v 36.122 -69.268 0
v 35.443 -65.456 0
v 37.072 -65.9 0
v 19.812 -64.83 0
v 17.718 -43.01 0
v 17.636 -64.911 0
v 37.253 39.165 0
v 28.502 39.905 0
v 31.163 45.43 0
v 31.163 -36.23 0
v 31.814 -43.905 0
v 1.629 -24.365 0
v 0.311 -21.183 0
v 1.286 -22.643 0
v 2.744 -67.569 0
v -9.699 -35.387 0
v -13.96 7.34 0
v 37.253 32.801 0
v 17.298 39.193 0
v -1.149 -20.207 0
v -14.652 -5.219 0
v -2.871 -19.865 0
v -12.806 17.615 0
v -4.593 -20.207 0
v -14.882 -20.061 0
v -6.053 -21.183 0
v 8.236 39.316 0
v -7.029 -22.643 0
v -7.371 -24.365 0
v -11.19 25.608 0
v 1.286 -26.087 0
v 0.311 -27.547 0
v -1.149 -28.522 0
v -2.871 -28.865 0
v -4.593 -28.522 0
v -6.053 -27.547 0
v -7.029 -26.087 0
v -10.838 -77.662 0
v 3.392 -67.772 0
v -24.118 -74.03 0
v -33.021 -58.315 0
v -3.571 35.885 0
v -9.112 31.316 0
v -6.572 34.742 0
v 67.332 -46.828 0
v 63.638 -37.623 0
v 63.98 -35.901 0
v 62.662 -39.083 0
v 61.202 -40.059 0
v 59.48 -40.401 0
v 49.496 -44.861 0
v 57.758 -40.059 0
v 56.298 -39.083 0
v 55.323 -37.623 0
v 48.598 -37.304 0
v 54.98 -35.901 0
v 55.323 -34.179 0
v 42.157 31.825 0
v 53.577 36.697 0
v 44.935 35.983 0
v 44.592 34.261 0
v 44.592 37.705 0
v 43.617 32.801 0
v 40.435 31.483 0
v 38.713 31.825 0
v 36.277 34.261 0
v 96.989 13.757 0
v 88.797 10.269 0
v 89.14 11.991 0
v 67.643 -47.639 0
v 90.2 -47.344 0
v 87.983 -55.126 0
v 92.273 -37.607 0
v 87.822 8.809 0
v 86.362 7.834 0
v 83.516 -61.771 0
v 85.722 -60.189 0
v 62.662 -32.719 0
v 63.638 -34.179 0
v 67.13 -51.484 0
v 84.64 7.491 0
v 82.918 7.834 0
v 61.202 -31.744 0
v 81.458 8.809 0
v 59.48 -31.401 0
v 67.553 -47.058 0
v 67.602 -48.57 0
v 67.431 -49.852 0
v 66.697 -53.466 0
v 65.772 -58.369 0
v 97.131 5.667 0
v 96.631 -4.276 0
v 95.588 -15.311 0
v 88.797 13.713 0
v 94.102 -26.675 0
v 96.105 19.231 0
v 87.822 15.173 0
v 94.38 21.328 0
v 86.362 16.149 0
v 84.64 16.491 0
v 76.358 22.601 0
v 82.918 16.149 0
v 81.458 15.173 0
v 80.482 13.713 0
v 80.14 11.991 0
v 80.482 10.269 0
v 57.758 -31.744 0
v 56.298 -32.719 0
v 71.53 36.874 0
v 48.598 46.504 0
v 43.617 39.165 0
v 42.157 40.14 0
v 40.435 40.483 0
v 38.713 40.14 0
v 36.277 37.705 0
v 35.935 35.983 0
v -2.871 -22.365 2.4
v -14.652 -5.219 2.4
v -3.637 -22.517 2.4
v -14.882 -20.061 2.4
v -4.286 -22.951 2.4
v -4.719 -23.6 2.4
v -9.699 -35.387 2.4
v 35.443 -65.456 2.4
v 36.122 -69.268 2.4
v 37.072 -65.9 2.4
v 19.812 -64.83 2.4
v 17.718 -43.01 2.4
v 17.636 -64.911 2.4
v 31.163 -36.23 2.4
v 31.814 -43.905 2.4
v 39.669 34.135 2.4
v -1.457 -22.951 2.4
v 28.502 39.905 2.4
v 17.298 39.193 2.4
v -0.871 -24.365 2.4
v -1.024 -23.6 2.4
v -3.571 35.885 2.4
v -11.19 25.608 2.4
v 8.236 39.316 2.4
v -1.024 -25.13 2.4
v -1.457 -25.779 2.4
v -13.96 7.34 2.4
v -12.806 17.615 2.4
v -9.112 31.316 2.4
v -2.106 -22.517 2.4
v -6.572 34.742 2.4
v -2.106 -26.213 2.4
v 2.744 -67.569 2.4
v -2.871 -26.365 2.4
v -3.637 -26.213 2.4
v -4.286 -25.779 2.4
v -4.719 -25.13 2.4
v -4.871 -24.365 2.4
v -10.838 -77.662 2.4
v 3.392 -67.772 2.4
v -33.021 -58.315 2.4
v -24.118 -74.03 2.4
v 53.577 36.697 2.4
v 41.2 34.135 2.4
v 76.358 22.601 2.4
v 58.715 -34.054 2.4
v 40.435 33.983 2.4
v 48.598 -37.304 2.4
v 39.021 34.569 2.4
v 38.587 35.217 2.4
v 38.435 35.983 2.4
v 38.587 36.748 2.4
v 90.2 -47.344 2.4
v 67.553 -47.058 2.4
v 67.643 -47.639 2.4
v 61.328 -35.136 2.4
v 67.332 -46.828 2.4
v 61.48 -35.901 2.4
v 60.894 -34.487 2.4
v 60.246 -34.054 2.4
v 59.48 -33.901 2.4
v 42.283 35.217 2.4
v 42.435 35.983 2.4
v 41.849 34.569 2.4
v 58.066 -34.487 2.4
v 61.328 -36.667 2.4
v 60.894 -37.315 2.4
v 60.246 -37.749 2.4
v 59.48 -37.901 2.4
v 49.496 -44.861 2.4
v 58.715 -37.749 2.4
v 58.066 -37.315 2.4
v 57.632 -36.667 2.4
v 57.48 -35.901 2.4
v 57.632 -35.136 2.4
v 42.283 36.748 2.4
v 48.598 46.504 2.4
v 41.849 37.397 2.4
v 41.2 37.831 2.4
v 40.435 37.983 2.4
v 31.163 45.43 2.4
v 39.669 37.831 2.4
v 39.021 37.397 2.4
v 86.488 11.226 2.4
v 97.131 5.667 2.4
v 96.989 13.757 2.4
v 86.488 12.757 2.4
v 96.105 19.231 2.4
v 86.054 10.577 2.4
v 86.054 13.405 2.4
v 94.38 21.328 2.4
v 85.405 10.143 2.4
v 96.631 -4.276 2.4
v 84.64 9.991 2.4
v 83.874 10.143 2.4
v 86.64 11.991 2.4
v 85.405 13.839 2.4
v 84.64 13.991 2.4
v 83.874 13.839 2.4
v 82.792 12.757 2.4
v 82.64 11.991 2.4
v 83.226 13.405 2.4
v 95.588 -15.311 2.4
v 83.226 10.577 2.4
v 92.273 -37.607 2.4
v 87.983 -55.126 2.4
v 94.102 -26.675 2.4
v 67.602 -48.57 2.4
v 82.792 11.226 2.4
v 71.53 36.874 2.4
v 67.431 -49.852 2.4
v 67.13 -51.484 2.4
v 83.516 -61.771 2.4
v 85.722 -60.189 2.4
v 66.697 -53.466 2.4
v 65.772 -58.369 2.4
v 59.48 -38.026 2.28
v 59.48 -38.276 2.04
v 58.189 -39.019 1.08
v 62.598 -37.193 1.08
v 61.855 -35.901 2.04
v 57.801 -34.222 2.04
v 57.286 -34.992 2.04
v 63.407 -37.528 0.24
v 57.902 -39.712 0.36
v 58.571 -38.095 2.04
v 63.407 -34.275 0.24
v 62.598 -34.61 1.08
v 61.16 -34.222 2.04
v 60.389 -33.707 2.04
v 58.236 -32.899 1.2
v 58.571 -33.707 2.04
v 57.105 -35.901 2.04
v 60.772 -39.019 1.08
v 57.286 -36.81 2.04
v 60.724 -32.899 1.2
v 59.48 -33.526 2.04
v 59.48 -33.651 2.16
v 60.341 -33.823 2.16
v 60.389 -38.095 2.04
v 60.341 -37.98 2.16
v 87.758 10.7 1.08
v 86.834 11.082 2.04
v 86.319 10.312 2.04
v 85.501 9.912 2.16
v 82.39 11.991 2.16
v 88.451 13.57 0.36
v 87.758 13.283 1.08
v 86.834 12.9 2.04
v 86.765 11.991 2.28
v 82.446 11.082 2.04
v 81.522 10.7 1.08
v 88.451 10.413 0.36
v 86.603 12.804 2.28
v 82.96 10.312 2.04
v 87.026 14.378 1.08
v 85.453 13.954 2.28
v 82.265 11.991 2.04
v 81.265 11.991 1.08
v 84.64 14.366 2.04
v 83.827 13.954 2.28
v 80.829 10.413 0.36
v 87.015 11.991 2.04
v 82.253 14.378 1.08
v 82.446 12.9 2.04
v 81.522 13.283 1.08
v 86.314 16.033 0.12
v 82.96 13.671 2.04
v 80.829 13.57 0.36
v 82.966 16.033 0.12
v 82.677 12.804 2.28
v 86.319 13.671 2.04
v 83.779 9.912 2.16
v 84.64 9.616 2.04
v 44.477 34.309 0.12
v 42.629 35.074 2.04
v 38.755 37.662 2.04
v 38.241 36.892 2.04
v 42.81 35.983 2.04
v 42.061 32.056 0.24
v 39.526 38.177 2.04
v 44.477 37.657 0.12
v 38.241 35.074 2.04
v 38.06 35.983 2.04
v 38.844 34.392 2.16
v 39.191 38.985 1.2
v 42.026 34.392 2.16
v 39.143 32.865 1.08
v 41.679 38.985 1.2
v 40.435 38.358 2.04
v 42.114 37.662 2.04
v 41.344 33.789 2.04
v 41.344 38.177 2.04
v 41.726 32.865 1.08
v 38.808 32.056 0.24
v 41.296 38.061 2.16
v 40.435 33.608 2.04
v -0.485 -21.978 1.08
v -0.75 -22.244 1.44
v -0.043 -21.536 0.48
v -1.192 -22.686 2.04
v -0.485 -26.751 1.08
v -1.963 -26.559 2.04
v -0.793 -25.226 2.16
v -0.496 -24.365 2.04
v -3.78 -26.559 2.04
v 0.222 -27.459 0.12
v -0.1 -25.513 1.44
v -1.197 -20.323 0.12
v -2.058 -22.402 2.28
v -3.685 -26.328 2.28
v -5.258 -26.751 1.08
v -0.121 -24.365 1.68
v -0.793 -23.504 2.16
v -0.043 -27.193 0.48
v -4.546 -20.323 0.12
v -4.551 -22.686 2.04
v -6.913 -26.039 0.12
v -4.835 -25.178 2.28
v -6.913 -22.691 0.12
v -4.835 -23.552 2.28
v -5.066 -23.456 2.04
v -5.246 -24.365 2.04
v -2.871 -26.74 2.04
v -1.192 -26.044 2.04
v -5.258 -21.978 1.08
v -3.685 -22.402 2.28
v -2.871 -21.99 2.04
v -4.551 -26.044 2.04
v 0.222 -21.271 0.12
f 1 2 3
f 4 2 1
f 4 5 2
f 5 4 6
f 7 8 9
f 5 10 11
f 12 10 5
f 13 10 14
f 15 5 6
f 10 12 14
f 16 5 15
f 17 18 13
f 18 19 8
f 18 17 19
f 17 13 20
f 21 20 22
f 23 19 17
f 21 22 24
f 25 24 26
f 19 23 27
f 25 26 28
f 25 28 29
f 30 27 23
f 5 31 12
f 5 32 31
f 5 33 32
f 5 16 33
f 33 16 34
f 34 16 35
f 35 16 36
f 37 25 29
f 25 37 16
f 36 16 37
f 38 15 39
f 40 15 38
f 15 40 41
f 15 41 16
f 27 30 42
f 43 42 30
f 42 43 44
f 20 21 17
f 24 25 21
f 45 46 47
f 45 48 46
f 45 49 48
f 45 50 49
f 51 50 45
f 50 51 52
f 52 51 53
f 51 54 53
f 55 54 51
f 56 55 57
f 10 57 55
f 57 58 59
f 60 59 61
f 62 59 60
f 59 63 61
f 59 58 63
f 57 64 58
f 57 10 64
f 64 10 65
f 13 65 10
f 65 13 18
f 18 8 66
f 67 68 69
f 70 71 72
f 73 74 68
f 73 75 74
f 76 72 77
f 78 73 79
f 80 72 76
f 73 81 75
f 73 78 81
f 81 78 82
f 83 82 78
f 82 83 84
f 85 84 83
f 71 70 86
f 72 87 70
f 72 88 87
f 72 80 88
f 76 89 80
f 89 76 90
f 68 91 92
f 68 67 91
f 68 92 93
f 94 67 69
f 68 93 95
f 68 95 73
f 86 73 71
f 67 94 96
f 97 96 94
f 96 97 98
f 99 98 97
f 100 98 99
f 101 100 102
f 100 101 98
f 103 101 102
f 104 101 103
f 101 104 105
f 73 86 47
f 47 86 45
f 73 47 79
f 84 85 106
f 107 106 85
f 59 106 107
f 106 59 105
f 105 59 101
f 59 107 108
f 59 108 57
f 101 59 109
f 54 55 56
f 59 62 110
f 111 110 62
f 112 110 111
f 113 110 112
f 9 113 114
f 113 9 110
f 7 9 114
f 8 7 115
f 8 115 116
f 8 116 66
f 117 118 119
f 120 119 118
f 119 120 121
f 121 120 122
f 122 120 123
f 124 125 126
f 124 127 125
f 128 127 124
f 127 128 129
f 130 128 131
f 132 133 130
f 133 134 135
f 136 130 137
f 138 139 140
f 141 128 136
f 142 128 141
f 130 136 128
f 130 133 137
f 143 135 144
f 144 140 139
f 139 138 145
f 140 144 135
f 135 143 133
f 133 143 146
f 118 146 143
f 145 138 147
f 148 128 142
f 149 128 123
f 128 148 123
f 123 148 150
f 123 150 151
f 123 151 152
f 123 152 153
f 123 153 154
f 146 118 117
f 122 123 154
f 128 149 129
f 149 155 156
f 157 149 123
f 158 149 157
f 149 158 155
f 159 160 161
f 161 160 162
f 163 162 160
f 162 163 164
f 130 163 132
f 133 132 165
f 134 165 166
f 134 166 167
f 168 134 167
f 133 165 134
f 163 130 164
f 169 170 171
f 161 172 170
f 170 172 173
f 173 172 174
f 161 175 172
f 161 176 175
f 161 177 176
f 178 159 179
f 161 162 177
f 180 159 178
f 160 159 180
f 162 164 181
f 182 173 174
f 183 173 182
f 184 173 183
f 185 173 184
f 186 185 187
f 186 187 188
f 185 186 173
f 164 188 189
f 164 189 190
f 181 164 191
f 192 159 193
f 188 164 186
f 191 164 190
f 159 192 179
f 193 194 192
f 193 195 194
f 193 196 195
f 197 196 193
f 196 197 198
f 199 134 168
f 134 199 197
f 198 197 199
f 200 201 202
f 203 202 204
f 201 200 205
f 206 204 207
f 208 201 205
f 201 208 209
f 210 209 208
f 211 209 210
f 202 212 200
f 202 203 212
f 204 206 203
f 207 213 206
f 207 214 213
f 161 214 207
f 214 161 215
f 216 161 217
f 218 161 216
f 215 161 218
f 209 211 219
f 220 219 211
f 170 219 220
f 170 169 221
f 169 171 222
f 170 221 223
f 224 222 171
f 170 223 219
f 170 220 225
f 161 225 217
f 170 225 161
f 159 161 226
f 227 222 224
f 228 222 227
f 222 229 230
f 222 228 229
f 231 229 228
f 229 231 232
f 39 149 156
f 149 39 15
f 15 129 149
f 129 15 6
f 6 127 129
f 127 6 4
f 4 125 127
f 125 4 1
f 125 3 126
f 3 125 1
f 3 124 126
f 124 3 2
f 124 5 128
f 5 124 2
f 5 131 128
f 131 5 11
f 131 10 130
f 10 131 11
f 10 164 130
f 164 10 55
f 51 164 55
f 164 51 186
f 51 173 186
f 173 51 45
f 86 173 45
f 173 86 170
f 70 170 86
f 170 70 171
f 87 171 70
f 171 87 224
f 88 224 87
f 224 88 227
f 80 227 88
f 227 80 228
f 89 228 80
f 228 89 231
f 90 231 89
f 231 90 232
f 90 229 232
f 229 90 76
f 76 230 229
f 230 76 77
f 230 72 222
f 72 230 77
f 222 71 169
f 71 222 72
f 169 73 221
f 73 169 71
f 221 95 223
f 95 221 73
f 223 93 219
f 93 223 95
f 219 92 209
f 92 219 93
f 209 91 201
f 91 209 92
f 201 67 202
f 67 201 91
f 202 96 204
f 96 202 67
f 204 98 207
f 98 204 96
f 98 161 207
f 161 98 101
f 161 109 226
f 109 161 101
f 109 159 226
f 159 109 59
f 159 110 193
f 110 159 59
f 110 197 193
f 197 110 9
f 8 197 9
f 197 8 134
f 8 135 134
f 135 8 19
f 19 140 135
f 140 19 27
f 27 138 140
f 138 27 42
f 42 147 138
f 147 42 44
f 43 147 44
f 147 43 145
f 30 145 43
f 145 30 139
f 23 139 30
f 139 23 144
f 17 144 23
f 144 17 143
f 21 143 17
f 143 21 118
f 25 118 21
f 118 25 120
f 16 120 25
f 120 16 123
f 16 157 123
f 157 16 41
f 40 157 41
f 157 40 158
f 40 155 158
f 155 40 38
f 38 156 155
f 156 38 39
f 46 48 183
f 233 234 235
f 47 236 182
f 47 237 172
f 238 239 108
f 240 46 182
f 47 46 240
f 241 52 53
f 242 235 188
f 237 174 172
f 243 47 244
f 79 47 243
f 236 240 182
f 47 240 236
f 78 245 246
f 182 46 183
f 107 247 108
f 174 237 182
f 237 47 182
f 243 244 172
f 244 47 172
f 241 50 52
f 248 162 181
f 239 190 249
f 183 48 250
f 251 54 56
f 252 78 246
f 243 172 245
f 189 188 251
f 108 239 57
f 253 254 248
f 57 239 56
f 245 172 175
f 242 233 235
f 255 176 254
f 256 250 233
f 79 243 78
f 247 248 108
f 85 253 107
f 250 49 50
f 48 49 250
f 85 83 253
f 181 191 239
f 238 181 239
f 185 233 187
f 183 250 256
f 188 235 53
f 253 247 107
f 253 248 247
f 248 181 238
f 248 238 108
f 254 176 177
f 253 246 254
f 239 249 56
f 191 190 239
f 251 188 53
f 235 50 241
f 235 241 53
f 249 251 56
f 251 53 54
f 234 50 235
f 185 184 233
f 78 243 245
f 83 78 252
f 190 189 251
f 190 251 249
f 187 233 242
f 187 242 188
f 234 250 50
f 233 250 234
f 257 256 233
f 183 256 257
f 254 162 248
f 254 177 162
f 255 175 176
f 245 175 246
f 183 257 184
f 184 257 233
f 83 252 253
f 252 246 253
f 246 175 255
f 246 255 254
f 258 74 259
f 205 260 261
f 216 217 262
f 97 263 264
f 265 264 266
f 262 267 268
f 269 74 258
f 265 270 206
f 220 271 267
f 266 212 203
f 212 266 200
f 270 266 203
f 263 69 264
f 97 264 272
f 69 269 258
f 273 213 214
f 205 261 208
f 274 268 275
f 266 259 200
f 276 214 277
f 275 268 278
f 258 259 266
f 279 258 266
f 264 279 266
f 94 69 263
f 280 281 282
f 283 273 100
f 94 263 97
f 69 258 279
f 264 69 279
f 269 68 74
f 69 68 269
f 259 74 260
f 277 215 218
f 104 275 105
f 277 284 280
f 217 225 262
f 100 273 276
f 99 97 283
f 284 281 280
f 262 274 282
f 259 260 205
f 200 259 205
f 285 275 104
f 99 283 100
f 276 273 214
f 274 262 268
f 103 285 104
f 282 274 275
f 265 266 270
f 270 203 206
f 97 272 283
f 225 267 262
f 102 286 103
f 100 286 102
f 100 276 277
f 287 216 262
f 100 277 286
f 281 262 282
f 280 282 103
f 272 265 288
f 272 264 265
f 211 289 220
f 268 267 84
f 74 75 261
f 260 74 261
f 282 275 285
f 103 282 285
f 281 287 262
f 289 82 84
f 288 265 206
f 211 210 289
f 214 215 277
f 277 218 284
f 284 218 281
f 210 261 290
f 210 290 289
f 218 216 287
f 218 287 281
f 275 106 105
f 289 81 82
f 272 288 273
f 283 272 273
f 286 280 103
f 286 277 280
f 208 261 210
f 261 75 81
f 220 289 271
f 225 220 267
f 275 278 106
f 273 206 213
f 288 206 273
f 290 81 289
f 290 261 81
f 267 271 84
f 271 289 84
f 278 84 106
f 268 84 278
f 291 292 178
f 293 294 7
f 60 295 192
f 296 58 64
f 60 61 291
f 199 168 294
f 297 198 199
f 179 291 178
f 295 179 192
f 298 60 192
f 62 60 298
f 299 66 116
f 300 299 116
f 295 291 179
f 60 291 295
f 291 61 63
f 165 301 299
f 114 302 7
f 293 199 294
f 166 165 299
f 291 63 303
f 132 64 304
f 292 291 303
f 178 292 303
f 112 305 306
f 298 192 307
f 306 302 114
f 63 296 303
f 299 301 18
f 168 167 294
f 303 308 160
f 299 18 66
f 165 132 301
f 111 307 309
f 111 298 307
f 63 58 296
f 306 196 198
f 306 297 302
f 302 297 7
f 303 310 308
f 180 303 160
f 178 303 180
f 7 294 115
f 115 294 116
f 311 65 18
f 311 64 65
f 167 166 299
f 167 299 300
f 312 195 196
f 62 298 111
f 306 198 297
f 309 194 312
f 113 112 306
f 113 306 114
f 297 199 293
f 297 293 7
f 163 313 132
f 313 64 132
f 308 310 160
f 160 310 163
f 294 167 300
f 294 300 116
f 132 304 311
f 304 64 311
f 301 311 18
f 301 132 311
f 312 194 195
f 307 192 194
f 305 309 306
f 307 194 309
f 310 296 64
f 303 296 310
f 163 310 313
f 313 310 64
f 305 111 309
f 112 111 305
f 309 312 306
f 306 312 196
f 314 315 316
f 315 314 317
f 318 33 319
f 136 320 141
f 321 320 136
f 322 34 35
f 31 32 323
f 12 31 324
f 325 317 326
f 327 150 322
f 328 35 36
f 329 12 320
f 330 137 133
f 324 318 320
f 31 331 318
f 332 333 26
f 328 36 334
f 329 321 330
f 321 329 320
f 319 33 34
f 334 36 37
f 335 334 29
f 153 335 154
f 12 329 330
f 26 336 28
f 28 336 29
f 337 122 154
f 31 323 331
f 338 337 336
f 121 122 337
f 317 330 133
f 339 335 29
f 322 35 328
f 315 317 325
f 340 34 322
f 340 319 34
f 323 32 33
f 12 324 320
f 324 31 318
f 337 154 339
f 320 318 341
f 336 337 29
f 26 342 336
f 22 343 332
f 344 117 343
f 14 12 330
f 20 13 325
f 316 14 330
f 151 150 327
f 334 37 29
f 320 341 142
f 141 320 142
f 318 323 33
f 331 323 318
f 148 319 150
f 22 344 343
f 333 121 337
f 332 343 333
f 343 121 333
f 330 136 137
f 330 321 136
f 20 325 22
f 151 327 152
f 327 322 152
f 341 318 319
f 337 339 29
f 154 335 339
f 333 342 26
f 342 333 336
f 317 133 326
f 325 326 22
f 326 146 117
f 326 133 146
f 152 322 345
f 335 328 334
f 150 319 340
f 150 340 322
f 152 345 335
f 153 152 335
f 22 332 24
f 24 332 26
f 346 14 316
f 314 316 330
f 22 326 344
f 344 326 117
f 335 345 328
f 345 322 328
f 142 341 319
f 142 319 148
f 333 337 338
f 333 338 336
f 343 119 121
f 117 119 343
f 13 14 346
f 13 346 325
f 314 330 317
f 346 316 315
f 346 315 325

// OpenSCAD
difference(){
	linear_extrude(height=2.400000, center=false, convexity=10, slices=20, scale=[1.000000, 1.000000], $fn=16)
		polygon(points=[[-14.881829, -20.060711], [-14.651771, -5.218757], [-13.959767, 7.339943], [-12.805816, 17.615387], [-11.189919, 25.607577], [-9.112077, 31.316512], [-6.572287, 34.742191], [-3.570552, 35.884616], [8.235822, 39.315873], [17.297865, 39.193318], [28.501680, 39.904884], [31.163388, 45.430470], [48.597618, 46.504312], [53.577484, 36.697223], [71.530308, 36.874018], [76.357842, 22.601417], [94.379988, 21.327630], [96.105182, 19.230905], [96.988956, 13.756741], [97.130926, 5.667102], [96.630711, -4.276049], [95.587927, -15.310747], [94.102191, -26.675029], [92.273121, -37.606930], [90.200333, -47.344487], [87.983445, -55.125736], [85.722074, -60.188712], [83.515837, -61.771452], [65.771950, -58.369283], [66.697296, -53.465832], [67.129590, -51.483529], [67.431262, -49.851611], [67.602312, -48.570081], [67.642740, -47.638936], [67.552546, -47.058178], [67.331731, -46.827806], [49.496186, -44.860698], [48.597618, -37.304312], [31.163388, -36.230470], [31.814351, -43.904884], [17.717994, -43.009609], [35.442781, -65.456179], [37.072059, -65.899573], [36.121991, -69.268159], [19.812201, -64.829592], [17.635520, -64.911272], [2.743570, -67.569144], [3.391719, -67.772410], [-10.837673, -77.661521], [-24.118242, -74.030071], [-33.020906, -58.315021], [-9.699329, -35.386525]], convexity=10);
	translate([59.480160, -35.901270, 0.000000])
		linear_extrude(height=2.400000, center=false, convexity=10, slices=20, scale=[0.444444, 0.444444], $fn=16)
			circle(4.500000);
	translate([84.639761, 11.991156, 0.000000])
		linear_extrude(height=2.400000, center=false, convexity=10, slices=20, scale=[0.444444, 0.444444], $fn=16)
			circle(4.500000);
	translate([40.434809, 35.982766, 0.000000])
		linear_extrude(height=2.400000, center=false, convexity=10, slices=20, scale=[0.444444, 0.444444], $fn=16)
			circle(4.500000);
	translate([-2.871406, -24.364927, 0.000000])
		linear_extrude(height=2.400000, center=false, convexity=10, slices=20, scale=[0.444444, 0.444444], $fn=16)
			circle(4.500000);
}
